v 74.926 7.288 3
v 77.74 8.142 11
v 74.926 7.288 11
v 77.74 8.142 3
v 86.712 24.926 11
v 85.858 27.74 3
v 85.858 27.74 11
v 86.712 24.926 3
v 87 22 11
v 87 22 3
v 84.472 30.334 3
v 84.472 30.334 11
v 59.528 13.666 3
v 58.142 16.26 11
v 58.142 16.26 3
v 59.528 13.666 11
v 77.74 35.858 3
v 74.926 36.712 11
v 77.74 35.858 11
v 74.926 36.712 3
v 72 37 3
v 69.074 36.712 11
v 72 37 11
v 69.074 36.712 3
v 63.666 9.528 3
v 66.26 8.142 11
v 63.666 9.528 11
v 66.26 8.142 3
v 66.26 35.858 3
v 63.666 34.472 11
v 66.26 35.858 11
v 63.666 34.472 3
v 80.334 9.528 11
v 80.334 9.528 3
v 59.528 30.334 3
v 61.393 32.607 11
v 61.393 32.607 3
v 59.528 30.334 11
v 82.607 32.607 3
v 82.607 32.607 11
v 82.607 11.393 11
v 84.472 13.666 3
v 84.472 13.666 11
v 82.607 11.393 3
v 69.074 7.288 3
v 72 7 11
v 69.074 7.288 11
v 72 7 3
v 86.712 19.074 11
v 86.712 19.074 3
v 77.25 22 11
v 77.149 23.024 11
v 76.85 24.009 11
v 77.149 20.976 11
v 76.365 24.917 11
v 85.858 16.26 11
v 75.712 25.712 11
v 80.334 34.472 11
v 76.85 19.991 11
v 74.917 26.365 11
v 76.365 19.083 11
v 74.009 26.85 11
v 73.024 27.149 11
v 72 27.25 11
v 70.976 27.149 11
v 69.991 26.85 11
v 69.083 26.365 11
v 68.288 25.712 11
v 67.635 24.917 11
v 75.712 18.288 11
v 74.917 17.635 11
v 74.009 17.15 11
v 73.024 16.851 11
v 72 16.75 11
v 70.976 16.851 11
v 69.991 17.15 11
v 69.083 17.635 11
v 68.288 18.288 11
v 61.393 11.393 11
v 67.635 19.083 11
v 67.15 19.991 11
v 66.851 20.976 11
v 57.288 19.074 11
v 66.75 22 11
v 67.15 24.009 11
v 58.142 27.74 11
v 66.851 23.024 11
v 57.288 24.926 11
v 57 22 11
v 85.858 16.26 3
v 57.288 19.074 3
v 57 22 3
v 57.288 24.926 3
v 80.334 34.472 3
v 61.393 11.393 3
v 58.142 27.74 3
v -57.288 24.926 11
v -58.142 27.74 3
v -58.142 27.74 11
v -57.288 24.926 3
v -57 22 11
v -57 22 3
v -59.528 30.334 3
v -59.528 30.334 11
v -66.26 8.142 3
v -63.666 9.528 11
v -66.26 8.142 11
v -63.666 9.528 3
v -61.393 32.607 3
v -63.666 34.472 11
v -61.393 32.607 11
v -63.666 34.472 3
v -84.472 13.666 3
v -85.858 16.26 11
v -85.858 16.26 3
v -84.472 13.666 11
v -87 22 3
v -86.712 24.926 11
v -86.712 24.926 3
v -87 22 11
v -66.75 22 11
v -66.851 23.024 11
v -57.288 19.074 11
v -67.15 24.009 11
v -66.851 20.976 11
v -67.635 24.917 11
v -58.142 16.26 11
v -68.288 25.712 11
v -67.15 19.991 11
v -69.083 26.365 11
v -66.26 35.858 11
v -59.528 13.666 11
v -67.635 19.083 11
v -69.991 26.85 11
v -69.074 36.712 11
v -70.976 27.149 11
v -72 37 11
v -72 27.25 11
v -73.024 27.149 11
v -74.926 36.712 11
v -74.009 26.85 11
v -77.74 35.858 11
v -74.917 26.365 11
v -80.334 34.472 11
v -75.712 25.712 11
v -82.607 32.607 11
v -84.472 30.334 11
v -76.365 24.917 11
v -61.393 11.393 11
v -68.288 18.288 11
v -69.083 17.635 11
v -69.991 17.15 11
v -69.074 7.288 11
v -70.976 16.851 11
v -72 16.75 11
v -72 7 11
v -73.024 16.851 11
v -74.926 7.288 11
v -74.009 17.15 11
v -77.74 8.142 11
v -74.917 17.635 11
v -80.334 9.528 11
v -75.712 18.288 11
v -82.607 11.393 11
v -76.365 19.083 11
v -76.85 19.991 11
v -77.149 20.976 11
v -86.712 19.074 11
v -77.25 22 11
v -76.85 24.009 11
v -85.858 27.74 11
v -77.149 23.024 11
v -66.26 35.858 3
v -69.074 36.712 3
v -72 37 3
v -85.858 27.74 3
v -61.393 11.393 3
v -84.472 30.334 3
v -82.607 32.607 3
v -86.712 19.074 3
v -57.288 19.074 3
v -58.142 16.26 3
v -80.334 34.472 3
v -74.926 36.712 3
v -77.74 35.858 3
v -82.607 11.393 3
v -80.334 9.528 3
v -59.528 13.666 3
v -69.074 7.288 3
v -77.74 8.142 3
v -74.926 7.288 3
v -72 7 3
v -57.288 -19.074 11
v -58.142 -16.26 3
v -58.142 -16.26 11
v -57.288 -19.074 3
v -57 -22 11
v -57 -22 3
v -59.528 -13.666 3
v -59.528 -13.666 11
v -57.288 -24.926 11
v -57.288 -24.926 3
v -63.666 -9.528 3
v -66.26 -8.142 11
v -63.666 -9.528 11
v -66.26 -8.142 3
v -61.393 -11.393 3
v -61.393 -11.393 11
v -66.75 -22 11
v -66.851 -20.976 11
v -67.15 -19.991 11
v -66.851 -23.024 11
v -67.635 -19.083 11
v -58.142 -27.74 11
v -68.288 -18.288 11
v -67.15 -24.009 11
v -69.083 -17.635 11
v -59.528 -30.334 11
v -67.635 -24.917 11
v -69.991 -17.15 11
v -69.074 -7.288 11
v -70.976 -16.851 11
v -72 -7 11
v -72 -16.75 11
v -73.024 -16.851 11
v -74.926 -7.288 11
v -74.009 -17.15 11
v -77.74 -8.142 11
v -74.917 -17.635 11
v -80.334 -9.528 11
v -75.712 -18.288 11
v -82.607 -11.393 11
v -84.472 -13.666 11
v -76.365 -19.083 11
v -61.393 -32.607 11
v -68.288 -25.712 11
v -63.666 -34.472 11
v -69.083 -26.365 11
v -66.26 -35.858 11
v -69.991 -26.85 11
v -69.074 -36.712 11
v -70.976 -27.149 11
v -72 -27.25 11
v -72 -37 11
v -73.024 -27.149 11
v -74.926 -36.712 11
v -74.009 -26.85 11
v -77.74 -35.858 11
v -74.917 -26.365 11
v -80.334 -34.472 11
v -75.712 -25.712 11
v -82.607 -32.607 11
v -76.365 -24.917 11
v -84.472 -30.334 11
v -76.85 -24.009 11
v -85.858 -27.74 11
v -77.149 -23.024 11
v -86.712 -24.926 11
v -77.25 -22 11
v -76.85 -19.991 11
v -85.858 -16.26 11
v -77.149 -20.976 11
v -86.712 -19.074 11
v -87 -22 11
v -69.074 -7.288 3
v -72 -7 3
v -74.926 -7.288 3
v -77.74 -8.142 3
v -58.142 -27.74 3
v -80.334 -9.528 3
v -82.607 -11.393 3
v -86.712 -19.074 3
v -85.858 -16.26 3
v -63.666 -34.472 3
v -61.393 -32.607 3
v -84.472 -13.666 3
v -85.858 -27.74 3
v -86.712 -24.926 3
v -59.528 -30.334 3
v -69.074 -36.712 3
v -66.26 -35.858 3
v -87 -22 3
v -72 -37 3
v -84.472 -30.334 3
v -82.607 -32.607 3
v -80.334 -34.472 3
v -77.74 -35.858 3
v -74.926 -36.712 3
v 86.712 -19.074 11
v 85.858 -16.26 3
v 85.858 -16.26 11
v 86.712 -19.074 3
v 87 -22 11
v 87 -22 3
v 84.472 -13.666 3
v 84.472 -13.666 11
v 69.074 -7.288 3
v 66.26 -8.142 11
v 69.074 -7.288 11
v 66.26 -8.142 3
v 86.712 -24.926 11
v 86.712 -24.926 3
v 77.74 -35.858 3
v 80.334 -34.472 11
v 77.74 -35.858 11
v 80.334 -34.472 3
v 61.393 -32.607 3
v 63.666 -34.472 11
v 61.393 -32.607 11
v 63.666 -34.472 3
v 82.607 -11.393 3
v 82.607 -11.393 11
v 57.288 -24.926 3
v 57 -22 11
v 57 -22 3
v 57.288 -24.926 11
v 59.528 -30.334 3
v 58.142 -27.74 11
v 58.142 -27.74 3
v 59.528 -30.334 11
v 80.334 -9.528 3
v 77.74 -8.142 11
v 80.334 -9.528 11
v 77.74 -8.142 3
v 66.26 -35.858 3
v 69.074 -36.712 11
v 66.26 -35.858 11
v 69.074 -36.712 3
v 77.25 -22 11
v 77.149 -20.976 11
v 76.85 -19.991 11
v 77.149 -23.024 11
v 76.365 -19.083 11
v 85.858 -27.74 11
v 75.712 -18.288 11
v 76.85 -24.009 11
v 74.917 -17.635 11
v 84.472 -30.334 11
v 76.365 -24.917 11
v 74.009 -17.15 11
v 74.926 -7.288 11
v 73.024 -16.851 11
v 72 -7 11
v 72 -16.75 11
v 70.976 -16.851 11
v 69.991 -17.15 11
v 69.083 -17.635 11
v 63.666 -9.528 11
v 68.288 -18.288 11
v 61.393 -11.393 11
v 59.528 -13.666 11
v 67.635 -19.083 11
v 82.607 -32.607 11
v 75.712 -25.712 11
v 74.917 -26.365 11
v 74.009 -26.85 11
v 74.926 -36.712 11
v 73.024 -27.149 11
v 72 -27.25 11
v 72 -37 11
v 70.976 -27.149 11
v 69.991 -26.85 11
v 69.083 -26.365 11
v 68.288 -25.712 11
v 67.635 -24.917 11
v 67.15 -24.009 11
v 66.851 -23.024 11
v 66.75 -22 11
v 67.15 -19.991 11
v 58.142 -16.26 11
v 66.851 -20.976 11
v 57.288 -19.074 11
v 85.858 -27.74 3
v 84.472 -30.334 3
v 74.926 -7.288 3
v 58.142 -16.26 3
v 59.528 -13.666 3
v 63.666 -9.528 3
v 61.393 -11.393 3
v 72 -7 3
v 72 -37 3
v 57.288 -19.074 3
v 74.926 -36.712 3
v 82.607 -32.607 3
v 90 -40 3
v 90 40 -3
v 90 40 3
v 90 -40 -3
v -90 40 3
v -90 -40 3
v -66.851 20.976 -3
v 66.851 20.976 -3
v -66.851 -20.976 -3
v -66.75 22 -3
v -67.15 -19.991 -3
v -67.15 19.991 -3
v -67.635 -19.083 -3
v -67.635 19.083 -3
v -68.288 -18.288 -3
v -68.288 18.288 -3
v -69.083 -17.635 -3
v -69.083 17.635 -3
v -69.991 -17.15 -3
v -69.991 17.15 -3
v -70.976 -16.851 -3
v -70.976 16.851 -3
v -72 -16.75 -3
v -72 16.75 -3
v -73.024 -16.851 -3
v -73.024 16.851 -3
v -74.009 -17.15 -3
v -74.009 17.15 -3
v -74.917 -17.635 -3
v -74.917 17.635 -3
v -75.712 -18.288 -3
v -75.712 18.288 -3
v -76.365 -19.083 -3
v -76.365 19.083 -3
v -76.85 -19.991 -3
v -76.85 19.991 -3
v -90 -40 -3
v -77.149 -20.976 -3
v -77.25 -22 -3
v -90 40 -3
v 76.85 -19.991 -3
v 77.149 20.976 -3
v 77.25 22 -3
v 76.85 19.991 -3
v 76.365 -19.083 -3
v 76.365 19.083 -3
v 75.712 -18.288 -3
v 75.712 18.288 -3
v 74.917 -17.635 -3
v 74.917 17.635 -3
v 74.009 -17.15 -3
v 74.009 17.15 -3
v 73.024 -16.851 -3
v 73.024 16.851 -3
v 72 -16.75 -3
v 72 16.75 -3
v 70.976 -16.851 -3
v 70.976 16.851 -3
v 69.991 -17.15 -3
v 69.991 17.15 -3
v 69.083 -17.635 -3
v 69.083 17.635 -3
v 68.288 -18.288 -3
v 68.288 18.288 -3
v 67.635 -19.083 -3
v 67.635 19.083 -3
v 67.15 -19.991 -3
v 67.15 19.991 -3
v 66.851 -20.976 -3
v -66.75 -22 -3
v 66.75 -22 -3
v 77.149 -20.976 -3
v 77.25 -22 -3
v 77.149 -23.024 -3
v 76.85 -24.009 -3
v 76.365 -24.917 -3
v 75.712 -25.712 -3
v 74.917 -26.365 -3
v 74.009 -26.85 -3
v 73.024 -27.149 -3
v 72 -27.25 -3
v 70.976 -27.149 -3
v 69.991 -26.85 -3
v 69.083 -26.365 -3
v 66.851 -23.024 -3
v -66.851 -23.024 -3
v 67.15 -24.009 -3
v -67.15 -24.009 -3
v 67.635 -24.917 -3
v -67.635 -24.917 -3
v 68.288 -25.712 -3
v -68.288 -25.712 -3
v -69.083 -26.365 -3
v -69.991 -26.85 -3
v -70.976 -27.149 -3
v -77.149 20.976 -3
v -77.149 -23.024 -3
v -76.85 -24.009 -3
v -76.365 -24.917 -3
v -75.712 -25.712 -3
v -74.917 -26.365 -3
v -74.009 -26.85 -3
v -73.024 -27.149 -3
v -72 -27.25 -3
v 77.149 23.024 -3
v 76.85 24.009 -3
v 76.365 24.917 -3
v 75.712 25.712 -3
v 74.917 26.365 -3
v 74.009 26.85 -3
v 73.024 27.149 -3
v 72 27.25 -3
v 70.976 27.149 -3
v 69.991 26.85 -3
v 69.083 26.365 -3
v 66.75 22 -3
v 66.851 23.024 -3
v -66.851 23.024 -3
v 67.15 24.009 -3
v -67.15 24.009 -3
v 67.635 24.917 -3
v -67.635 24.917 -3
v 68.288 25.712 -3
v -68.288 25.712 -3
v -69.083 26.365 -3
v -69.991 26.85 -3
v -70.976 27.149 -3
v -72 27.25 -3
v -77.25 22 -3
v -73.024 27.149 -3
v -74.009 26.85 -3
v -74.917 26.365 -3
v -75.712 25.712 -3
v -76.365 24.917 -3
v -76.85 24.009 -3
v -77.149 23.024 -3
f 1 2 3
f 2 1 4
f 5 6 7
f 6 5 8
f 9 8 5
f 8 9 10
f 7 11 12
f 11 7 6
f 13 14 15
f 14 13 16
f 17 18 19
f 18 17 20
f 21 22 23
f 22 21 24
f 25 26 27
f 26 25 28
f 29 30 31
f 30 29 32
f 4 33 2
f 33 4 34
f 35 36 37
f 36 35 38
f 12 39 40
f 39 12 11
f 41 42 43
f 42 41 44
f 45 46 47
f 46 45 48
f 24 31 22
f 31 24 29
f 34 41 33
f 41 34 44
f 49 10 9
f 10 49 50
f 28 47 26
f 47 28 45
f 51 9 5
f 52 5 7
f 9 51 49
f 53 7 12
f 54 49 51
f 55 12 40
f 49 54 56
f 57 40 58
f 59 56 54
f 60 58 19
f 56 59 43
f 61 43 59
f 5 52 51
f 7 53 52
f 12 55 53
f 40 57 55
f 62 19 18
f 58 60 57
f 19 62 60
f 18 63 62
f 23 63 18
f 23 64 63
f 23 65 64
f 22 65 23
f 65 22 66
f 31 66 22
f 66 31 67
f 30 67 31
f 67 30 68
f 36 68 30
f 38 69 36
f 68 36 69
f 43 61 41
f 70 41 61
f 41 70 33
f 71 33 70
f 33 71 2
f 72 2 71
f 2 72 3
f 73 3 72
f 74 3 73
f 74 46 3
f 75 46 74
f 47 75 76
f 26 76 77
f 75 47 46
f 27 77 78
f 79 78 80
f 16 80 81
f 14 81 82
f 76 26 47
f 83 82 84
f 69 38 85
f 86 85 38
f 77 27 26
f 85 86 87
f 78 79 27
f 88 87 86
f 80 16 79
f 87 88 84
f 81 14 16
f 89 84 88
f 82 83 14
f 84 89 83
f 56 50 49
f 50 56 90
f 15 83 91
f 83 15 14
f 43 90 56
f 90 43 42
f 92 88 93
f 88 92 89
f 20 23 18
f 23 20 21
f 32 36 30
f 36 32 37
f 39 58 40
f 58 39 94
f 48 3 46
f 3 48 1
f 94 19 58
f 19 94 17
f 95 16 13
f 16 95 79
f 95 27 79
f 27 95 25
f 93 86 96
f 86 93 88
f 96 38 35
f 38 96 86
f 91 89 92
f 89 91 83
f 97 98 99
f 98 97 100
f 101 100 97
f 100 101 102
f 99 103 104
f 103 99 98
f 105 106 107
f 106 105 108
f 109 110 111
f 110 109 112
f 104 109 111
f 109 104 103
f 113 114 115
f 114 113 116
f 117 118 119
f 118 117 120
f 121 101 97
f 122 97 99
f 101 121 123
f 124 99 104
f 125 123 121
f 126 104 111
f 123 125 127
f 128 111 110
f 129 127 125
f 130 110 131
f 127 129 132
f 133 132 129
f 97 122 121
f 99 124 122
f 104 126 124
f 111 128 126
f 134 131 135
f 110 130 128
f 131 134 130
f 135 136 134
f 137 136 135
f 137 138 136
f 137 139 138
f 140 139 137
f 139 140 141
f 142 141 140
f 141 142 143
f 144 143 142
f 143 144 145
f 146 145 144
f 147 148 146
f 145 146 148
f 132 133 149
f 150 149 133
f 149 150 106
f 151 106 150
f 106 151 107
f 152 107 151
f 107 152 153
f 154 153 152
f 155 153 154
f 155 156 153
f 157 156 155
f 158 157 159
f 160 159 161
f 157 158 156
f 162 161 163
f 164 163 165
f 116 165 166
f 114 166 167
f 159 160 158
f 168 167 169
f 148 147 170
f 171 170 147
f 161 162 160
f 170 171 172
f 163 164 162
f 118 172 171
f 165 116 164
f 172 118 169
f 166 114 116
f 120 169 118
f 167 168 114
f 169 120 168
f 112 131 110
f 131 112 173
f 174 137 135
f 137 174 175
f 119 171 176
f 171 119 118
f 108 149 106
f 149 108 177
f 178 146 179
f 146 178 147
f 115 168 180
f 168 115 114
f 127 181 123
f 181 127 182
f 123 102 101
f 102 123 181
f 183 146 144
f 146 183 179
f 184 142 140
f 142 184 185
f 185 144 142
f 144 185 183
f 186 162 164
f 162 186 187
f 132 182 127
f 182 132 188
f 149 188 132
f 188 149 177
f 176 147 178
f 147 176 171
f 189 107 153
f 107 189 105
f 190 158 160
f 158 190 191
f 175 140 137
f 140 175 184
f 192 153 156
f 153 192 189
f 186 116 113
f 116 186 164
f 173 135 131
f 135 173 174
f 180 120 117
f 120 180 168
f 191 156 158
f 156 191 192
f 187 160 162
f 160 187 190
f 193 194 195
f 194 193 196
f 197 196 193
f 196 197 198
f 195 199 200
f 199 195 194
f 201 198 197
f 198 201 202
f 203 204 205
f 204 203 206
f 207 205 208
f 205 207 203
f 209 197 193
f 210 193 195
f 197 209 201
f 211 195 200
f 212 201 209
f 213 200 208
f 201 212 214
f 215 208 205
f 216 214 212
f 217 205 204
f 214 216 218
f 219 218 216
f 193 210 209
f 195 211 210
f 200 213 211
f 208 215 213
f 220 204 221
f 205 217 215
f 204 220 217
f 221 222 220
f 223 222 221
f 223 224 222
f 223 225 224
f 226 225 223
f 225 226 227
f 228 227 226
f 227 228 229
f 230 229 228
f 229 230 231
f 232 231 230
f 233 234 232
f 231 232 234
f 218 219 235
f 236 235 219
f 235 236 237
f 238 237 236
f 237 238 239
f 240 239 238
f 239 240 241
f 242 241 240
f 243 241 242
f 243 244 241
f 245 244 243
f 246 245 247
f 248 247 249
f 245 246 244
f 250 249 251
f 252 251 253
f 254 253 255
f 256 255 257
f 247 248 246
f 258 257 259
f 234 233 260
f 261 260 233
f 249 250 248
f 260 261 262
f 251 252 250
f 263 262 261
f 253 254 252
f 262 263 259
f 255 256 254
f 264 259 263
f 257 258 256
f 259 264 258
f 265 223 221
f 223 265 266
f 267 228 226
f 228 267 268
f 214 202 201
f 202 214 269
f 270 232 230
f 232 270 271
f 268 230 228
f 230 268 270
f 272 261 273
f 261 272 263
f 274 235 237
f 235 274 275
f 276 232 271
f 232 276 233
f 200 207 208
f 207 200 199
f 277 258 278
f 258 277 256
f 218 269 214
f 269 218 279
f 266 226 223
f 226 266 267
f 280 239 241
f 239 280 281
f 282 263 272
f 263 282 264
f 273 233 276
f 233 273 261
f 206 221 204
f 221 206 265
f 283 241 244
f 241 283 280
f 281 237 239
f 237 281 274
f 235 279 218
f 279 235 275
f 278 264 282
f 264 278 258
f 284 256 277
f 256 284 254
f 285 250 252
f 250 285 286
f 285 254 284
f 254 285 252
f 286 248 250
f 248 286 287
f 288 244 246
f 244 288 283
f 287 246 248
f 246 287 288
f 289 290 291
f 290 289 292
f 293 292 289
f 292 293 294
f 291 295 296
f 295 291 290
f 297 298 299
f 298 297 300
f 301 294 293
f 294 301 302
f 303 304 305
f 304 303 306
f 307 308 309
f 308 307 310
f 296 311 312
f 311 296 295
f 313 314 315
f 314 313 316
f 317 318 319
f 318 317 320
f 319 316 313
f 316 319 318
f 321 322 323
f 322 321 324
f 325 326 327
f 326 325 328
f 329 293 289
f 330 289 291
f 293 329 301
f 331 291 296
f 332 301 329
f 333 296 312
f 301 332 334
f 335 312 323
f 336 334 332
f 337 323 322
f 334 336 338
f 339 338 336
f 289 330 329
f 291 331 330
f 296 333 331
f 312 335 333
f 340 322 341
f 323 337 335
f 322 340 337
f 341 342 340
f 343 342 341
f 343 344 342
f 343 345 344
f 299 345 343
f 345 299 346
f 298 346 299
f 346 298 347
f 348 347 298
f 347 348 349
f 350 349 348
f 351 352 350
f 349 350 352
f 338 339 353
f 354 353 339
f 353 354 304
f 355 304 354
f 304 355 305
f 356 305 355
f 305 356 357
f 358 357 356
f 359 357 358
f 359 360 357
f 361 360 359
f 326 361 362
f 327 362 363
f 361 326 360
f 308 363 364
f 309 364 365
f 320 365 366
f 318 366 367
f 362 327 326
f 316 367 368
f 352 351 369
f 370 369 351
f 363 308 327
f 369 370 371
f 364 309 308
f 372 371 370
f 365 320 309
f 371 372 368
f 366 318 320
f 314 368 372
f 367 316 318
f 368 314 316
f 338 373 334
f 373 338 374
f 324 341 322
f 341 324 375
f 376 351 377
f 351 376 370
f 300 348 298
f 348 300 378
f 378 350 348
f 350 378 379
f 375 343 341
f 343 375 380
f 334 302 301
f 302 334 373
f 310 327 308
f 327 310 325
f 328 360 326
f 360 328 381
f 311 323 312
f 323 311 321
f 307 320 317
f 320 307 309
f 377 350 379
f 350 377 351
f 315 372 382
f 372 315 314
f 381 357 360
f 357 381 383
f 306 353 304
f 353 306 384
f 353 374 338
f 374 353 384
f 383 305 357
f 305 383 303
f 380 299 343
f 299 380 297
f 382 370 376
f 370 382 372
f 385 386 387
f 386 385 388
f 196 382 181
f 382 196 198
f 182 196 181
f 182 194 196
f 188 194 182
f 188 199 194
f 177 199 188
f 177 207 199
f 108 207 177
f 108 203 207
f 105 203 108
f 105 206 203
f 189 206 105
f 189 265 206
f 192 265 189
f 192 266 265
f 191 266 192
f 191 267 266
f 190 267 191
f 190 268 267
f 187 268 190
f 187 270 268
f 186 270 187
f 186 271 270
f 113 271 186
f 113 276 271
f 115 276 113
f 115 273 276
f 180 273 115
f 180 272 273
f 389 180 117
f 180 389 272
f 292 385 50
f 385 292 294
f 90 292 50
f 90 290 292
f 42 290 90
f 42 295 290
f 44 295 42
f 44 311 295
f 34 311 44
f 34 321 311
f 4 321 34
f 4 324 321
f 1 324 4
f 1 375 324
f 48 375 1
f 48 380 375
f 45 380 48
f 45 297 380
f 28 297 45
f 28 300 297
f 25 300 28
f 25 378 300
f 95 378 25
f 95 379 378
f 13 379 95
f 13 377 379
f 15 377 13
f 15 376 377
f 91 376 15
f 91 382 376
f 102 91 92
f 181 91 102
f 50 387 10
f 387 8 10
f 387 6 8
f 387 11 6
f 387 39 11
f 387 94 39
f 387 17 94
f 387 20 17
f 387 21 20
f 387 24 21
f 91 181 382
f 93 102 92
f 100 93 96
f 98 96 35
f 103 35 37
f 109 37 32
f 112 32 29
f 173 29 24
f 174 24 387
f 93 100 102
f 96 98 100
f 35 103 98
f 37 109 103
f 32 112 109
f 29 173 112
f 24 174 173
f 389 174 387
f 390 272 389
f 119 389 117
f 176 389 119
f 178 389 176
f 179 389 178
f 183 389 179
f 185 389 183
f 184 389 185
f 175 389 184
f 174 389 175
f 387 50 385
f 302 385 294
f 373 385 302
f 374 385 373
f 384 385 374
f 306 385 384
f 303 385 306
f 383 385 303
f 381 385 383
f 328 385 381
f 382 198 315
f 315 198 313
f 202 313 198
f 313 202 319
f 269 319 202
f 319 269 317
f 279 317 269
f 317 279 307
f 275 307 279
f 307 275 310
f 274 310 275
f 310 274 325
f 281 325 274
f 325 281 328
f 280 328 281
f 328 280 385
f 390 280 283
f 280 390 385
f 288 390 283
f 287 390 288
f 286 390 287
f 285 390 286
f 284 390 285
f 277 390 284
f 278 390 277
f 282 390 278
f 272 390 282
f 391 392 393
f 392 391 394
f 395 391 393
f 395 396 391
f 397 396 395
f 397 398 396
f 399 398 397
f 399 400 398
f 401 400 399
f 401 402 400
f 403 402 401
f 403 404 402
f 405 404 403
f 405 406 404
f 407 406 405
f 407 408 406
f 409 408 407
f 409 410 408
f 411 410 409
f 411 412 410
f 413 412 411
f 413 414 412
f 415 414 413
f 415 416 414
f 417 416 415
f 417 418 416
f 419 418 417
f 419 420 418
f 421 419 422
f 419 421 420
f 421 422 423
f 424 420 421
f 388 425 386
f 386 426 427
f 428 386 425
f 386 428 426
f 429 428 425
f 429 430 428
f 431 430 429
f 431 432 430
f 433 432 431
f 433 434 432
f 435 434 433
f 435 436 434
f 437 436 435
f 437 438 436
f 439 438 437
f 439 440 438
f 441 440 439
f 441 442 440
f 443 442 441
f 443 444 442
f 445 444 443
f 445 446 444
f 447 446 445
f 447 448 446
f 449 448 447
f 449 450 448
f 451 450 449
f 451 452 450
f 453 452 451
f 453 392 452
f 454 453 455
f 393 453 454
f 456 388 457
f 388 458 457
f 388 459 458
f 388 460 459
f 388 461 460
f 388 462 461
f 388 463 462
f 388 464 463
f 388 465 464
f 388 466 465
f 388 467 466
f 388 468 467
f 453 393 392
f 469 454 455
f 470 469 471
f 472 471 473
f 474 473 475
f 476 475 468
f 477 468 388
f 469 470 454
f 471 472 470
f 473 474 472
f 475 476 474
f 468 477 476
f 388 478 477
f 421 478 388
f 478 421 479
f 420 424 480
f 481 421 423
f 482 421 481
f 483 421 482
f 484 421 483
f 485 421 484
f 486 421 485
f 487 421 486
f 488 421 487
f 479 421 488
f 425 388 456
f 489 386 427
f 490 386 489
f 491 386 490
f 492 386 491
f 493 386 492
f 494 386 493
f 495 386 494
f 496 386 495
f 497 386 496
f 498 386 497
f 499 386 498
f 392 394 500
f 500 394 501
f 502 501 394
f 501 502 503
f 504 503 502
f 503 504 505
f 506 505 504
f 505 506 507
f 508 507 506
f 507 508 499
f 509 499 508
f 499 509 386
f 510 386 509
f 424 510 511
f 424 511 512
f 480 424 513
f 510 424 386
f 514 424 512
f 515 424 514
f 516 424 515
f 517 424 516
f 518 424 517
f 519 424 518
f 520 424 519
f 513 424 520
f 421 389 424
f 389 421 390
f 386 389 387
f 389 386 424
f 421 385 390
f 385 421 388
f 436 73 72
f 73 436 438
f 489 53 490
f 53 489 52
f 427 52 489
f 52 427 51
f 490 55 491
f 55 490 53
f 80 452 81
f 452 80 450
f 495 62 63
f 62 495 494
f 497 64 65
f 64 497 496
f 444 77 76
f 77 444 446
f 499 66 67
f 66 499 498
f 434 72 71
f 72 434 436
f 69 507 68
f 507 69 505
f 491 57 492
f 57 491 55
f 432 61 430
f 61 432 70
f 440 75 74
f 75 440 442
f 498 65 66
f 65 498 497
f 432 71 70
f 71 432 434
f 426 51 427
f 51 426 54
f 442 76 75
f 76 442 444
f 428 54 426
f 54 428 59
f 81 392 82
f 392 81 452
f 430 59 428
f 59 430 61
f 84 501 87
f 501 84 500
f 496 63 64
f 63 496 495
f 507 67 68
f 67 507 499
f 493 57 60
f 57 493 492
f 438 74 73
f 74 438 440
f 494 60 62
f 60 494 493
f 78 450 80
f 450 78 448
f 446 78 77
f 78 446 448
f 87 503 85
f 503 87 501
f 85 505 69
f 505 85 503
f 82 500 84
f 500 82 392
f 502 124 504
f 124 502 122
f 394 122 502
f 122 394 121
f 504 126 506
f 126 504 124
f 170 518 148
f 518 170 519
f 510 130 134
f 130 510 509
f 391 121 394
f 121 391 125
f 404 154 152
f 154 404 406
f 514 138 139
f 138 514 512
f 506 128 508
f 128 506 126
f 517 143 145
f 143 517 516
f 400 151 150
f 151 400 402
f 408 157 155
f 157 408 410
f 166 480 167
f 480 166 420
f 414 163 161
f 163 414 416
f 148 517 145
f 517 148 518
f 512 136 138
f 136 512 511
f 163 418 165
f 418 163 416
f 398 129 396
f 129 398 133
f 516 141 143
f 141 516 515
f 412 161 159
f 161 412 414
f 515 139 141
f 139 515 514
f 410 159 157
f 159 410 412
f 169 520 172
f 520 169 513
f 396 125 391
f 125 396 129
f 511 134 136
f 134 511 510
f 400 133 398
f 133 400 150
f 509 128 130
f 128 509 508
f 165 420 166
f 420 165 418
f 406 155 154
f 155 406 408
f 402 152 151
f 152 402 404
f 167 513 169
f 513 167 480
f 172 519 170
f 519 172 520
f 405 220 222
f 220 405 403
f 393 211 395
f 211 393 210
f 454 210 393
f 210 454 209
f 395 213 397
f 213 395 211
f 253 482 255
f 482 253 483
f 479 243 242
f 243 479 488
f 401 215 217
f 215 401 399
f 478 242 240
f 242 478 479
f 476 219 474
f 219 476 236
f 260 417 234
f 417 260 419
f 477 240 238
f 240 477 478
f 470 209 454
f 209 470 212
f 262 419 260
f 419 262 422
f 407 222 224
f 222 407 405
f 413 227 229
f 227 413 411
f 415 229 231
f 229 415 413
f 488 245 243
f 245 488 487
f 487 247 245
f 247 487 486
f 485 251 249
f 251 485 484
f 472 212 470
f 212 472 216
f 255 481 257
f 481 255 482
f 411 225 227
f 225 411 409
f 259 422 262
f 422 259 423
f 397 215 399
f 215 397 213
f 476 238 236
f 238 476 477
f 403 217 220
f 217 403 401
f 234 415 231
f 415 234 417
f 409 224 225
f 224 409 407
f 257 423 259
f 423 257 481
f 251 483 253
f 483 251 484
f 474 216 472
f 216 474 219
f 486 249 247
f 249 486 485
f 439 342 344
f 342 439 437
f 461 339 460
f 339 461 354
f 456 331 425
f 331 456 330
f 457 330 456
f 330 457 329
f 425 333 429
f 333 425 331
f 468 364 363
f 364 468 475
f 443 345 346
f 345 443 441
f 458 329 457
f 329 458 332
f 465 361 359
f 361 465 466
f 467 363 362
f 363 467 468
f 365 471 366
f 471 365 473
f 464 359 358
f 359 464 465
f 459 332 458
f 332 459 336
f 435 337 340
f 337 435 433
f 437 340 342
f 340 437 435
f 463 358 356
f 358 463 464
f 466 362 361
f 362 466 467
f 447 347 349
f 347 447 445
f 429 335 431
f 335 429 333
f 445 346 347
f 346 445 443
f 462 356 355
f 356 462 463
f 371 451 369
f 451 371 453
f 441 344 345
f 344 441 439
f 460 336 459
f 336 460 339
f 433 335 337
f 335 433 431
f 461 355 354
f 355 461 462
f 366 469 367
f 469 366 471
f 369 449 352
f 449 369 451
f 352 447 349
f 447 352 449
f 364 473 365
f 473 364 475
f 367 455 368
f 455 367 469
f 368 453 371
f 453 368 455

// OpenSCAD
$fn = 32;

// ----------------------------------------------------------------------
// Anchor pads 180 x 80 x 14
// four corner bosses with anchor holes
// ----------------------------------------------------------------------

// --- parameters (mm) ---
plate = [180, 80, 6];  // base plate size (x, y, z)
pads = 4;              // boss count, one per corner
edge = 18;             // boss centre offset from the plate edge
boss_d = 30;           // boss diameter
boss_h = 8;            // boss height above the base plate
hole_d = 10.5;         // hole diameter

// --- derived feature positions (mm) ---
height = plate[2] + boss_h;      // = 14   overall height of the part
corner_x = plate[0] / 2 - edge;  // = 72   boss centre X
corner_y = plate[1] / 2 - edge;  // = 22   boss centre Y
feature_centers = [
  [corner_x, corner_y],
  [-corner_x, corner_y],
  [-corner_x, -corner_y],
  [corner_x, -corner_y]
];   // boss centres, anchor holes are drilled there

// base plate, four bosses standing on it, anchor holes all the way through
difference() {
  union() {
    cube(plate, center = true);
    for (centre = feature_centers)
      translate([centre[0], centre[1], plate[2] / 2 - 1])
        cylinder(d = boss_d, h = boss_h + 1);
  }
  for (centre = feature_centers)
    translate([centre[0], centre[1], -height])
      cylinder(d = hole_d, h = 2 * height + 2);  // through boss and plate
}
